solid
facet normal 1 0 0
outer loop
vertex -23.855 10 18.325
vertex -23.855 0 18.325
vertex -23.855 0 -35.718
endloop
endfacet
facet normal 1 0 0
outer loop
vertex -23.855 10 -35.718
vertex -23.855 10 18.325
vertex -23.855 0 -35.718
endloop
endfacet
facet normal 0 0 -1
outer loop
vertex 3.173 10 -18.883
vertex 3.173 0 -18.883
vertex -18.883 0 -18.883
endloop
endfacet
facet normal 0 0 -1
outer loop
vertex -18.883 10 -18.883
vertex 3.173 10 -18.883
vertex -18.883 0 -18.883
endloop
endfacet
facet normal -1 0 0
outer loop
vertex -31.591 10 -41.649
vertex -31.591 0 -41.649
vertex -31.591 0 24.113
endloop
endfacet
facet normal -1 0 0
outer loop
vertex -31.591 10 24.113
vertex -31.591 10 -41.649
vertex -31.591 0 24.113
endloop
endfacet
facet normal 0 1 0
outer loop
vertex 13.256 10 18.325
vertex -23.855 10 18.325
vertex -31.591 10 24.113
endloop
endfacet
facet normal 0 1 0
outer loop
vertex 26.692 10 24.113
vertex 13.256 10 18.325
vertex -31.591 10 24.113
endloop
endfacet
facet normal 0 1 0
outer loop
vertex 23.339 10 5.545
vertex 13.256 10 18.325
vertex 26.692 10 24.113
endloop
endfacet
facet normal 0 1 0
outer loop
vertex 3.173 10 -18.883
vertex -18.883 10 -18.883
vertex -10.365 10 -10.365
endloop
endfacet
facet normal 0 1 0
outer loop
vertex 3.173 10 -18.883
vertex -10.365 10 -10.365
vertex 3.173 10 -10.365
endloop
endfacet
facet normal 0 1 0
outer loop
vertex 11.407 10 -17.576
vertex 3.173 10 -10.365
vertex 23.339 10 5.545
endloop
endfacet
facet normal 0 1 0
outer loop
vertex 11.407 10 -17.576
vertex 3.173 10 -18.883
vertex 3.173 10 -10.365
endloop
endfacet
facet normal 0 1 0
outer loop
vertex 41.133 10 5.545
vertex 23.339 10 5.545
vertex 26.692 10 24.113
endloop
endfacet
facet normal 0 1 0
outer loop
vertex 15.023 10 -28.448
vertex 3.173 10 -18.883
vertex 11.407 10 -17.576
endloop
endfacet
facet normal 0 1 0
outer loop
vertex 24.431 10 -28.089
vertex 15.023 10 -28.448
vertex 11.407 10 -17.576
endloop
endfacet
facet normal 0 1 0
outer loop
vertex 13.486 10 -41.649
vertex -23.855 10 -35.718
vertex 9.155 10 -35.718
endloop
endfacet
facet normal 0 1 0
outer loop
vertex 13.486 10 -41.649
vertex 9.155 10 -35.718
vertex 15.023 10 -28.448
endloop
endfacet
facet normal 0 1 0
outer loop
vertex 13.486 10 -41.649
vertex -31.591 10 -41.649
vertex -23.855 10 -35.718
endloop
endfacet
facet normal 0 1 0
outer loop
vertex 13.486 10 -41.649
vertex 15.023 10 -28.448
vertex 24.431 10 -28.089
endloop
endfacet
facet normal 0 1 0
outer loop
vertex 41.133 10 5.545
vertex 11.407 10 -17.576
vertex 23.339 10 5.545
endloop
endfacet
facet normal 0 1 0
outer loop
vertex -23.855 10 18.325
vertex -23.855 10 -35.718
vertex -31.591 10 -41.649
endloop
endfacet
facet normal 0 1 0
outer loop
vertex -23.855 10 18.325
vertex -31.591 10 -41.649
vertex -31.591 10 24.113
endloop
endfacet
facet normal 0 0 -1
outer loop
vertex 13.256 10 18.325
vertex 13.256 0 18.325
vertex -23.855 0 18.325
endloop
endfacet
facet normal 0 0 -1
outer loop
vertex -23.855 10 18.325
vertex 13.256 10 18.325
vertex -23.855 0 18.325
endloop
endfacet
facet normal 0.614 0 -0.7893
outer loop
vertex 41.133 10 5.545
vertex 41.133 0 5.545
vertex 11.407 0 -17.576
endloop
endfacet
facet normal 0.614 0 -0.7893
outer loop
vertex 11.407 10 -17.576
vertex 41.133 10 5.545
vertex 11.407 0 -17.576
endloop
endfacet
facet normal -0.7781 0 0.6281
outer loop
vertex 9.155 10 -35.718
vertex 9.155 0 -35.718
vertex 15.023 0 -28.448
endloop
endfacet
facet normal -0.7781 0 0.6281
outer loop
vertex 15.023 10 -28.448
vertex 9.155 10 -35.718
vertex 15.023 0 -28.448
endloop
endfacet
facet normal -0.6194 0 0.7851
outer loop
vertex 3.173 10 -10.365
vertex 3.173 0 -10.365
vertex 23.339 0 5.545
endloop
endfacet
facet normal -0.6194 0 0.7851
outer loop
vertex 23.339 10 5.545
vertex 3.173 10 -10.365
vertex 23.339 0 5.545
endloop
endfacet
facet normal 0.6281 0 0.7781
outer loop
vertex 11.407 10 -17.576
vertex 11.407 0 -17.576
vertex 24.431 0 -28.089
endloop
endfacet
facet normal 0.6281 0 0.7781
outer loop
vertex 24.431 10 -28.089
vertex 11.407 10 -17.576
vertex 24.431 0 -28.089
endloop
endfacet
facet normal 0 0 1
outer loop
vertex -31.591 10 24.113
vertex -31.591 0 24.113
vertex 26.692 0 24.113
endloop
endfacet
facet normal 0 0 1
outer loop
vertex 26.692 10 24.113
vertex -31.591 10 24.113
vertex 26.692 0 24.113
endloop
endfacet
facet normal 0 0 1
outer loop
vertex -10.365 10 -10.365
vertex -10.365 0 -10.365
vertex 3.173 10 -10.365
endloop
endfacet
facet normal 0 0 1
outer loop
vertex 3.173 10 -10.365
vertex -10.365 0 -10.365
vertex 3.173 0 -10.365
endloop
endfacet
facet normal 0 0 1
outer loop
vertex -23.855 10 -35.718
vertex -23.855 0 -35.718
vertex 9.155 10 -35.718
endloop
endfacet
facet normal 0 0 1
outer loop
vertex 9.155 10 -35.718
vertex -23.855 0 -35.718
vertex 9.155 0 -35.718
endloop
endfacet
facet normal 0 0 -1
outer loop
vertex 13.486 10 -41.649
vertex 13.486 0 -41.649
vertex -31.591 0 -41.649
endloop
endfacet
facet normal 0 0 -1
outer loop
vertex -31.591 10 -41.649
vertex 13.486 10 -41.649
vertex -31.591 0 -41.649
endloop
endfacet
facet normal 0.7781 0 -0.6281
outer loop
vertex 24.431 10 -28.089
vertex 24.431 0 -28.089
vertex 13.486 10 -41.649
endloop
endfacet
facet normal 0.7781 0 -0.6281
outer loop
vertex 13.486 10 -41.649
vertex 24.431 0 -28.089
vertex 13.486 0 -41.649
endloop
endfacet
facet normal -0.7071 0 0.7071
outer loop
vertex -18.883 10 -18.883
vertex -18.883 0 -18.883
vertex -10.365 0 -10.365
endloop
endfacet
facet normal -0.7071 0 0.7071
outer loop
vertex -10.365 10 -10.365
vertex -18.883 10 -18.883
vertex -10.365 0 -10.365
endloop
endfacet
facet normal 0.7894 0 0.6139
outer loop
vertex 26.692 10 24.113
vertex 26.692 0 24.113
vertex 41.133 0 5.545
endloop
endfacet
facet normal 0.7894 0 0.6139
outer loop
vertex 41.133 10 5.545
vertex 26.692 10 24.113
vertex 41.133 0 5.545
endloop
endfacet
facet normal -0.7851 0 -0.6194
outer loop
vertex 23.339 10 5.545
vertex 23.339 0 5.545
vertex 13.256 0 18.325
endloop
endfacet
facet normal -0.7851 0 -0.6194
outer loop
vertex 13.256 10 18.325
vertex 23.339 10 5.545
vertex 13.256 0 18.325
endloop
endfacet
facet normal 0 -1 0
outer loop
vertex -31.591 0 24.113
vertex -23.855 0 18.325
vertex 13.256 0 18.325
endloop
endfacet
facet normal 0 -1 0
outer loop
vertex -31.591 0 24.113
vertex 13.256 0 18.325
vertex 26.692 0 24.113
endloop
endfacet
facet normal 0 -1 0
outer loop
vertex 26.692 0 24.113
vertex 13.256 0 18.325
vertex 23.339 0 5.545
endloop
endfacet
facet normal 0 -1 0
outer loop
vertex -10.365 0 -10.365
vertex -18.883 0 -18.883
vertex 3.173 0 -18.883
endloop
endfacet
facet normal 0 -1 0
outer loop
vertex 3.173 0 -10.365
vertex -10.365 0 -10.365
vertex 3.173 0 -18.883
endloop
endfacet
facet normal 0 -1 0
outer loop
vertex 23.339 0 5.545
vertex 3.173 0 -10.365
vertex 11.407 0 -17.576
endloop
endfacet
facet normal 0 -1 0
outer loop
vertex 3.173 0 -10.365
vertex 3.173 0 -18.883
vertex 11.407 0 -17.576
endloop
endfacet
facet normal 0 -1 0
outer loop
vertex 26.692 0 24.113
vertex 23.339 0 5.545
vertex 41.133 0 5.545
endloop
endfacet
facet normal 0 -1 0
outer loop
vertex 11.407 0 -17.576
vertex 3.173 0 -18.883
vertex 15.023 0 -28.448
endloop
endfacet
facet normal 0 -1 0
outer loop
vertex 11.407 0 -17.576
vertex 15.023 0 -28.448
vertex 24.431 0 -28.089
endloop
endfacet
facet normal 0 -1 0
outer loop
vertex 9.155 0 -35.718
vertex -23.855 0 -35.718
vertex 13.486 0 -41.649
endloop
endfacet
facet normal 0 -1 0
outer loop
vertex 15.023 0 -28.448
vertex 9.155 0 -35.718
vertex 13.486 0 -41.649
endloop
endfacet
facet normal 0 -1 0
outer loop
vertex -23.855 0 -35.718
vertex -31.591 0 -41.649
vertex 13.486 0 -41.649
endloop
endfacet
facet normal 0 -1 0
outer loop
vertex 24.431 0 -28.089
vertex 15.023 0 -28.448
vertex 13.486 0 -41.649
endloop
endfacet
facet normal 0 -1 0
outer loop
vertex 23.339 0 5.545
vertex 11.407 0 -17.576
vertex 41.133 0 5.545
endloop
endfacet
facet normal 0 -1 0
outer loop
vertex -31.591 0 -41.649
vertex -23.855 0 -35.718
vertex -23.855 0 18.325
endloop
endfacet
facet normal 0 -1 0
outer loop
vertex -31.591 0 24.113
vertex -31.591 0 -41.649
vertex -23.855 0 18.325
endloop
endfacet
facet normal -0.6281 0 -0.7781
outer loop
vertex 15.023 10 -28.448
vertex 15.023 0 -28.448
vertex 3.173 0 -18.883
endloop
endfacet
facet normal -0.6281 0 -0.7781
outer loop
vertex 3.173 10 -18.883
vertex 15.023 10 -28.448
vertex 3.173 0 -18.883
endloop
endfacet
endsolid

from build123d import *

# Parameters (mm, degrees)
BOSS_EXTRUDE1_DEPTH = 10


with BuildPart() as part:
    # Sketch1 → Boss-Extrude1 (new body)
    with BuildSketch(Plane(origin=(0, 0, 0), x_dir=(1, 0, 0), z_dir=(0, 1, 0))):
        Polygon((-31.591389498, 41.649056358), (-31.591389498, -24.112611576), (26.691500514, -24.112611576), (41.13327857, -5.544611218), (11.406624151, 17.576119997), (24.431058906, 28.088776811), (13.485895614, 41.649056358), align=None)
        Polygon((-23.854722682, 35.717611799), (9.155055732, 35.717611799), (15.022851217, 28.447830164), (3.172826817, 18.883097253), (-18.883097253, 18.883097253), (-10.365163505, 10.365163505), (3.172826817, 10.365163505), (23.338944894, -5.544611218), (13.255885856, -18.325191879), (-23.854722682, -18.325191879), align=None, mode=Mode.SUBTRACT)
    extrude(amount=BOSS_EXTRUDE1_DEPTH)


solid = part.part
